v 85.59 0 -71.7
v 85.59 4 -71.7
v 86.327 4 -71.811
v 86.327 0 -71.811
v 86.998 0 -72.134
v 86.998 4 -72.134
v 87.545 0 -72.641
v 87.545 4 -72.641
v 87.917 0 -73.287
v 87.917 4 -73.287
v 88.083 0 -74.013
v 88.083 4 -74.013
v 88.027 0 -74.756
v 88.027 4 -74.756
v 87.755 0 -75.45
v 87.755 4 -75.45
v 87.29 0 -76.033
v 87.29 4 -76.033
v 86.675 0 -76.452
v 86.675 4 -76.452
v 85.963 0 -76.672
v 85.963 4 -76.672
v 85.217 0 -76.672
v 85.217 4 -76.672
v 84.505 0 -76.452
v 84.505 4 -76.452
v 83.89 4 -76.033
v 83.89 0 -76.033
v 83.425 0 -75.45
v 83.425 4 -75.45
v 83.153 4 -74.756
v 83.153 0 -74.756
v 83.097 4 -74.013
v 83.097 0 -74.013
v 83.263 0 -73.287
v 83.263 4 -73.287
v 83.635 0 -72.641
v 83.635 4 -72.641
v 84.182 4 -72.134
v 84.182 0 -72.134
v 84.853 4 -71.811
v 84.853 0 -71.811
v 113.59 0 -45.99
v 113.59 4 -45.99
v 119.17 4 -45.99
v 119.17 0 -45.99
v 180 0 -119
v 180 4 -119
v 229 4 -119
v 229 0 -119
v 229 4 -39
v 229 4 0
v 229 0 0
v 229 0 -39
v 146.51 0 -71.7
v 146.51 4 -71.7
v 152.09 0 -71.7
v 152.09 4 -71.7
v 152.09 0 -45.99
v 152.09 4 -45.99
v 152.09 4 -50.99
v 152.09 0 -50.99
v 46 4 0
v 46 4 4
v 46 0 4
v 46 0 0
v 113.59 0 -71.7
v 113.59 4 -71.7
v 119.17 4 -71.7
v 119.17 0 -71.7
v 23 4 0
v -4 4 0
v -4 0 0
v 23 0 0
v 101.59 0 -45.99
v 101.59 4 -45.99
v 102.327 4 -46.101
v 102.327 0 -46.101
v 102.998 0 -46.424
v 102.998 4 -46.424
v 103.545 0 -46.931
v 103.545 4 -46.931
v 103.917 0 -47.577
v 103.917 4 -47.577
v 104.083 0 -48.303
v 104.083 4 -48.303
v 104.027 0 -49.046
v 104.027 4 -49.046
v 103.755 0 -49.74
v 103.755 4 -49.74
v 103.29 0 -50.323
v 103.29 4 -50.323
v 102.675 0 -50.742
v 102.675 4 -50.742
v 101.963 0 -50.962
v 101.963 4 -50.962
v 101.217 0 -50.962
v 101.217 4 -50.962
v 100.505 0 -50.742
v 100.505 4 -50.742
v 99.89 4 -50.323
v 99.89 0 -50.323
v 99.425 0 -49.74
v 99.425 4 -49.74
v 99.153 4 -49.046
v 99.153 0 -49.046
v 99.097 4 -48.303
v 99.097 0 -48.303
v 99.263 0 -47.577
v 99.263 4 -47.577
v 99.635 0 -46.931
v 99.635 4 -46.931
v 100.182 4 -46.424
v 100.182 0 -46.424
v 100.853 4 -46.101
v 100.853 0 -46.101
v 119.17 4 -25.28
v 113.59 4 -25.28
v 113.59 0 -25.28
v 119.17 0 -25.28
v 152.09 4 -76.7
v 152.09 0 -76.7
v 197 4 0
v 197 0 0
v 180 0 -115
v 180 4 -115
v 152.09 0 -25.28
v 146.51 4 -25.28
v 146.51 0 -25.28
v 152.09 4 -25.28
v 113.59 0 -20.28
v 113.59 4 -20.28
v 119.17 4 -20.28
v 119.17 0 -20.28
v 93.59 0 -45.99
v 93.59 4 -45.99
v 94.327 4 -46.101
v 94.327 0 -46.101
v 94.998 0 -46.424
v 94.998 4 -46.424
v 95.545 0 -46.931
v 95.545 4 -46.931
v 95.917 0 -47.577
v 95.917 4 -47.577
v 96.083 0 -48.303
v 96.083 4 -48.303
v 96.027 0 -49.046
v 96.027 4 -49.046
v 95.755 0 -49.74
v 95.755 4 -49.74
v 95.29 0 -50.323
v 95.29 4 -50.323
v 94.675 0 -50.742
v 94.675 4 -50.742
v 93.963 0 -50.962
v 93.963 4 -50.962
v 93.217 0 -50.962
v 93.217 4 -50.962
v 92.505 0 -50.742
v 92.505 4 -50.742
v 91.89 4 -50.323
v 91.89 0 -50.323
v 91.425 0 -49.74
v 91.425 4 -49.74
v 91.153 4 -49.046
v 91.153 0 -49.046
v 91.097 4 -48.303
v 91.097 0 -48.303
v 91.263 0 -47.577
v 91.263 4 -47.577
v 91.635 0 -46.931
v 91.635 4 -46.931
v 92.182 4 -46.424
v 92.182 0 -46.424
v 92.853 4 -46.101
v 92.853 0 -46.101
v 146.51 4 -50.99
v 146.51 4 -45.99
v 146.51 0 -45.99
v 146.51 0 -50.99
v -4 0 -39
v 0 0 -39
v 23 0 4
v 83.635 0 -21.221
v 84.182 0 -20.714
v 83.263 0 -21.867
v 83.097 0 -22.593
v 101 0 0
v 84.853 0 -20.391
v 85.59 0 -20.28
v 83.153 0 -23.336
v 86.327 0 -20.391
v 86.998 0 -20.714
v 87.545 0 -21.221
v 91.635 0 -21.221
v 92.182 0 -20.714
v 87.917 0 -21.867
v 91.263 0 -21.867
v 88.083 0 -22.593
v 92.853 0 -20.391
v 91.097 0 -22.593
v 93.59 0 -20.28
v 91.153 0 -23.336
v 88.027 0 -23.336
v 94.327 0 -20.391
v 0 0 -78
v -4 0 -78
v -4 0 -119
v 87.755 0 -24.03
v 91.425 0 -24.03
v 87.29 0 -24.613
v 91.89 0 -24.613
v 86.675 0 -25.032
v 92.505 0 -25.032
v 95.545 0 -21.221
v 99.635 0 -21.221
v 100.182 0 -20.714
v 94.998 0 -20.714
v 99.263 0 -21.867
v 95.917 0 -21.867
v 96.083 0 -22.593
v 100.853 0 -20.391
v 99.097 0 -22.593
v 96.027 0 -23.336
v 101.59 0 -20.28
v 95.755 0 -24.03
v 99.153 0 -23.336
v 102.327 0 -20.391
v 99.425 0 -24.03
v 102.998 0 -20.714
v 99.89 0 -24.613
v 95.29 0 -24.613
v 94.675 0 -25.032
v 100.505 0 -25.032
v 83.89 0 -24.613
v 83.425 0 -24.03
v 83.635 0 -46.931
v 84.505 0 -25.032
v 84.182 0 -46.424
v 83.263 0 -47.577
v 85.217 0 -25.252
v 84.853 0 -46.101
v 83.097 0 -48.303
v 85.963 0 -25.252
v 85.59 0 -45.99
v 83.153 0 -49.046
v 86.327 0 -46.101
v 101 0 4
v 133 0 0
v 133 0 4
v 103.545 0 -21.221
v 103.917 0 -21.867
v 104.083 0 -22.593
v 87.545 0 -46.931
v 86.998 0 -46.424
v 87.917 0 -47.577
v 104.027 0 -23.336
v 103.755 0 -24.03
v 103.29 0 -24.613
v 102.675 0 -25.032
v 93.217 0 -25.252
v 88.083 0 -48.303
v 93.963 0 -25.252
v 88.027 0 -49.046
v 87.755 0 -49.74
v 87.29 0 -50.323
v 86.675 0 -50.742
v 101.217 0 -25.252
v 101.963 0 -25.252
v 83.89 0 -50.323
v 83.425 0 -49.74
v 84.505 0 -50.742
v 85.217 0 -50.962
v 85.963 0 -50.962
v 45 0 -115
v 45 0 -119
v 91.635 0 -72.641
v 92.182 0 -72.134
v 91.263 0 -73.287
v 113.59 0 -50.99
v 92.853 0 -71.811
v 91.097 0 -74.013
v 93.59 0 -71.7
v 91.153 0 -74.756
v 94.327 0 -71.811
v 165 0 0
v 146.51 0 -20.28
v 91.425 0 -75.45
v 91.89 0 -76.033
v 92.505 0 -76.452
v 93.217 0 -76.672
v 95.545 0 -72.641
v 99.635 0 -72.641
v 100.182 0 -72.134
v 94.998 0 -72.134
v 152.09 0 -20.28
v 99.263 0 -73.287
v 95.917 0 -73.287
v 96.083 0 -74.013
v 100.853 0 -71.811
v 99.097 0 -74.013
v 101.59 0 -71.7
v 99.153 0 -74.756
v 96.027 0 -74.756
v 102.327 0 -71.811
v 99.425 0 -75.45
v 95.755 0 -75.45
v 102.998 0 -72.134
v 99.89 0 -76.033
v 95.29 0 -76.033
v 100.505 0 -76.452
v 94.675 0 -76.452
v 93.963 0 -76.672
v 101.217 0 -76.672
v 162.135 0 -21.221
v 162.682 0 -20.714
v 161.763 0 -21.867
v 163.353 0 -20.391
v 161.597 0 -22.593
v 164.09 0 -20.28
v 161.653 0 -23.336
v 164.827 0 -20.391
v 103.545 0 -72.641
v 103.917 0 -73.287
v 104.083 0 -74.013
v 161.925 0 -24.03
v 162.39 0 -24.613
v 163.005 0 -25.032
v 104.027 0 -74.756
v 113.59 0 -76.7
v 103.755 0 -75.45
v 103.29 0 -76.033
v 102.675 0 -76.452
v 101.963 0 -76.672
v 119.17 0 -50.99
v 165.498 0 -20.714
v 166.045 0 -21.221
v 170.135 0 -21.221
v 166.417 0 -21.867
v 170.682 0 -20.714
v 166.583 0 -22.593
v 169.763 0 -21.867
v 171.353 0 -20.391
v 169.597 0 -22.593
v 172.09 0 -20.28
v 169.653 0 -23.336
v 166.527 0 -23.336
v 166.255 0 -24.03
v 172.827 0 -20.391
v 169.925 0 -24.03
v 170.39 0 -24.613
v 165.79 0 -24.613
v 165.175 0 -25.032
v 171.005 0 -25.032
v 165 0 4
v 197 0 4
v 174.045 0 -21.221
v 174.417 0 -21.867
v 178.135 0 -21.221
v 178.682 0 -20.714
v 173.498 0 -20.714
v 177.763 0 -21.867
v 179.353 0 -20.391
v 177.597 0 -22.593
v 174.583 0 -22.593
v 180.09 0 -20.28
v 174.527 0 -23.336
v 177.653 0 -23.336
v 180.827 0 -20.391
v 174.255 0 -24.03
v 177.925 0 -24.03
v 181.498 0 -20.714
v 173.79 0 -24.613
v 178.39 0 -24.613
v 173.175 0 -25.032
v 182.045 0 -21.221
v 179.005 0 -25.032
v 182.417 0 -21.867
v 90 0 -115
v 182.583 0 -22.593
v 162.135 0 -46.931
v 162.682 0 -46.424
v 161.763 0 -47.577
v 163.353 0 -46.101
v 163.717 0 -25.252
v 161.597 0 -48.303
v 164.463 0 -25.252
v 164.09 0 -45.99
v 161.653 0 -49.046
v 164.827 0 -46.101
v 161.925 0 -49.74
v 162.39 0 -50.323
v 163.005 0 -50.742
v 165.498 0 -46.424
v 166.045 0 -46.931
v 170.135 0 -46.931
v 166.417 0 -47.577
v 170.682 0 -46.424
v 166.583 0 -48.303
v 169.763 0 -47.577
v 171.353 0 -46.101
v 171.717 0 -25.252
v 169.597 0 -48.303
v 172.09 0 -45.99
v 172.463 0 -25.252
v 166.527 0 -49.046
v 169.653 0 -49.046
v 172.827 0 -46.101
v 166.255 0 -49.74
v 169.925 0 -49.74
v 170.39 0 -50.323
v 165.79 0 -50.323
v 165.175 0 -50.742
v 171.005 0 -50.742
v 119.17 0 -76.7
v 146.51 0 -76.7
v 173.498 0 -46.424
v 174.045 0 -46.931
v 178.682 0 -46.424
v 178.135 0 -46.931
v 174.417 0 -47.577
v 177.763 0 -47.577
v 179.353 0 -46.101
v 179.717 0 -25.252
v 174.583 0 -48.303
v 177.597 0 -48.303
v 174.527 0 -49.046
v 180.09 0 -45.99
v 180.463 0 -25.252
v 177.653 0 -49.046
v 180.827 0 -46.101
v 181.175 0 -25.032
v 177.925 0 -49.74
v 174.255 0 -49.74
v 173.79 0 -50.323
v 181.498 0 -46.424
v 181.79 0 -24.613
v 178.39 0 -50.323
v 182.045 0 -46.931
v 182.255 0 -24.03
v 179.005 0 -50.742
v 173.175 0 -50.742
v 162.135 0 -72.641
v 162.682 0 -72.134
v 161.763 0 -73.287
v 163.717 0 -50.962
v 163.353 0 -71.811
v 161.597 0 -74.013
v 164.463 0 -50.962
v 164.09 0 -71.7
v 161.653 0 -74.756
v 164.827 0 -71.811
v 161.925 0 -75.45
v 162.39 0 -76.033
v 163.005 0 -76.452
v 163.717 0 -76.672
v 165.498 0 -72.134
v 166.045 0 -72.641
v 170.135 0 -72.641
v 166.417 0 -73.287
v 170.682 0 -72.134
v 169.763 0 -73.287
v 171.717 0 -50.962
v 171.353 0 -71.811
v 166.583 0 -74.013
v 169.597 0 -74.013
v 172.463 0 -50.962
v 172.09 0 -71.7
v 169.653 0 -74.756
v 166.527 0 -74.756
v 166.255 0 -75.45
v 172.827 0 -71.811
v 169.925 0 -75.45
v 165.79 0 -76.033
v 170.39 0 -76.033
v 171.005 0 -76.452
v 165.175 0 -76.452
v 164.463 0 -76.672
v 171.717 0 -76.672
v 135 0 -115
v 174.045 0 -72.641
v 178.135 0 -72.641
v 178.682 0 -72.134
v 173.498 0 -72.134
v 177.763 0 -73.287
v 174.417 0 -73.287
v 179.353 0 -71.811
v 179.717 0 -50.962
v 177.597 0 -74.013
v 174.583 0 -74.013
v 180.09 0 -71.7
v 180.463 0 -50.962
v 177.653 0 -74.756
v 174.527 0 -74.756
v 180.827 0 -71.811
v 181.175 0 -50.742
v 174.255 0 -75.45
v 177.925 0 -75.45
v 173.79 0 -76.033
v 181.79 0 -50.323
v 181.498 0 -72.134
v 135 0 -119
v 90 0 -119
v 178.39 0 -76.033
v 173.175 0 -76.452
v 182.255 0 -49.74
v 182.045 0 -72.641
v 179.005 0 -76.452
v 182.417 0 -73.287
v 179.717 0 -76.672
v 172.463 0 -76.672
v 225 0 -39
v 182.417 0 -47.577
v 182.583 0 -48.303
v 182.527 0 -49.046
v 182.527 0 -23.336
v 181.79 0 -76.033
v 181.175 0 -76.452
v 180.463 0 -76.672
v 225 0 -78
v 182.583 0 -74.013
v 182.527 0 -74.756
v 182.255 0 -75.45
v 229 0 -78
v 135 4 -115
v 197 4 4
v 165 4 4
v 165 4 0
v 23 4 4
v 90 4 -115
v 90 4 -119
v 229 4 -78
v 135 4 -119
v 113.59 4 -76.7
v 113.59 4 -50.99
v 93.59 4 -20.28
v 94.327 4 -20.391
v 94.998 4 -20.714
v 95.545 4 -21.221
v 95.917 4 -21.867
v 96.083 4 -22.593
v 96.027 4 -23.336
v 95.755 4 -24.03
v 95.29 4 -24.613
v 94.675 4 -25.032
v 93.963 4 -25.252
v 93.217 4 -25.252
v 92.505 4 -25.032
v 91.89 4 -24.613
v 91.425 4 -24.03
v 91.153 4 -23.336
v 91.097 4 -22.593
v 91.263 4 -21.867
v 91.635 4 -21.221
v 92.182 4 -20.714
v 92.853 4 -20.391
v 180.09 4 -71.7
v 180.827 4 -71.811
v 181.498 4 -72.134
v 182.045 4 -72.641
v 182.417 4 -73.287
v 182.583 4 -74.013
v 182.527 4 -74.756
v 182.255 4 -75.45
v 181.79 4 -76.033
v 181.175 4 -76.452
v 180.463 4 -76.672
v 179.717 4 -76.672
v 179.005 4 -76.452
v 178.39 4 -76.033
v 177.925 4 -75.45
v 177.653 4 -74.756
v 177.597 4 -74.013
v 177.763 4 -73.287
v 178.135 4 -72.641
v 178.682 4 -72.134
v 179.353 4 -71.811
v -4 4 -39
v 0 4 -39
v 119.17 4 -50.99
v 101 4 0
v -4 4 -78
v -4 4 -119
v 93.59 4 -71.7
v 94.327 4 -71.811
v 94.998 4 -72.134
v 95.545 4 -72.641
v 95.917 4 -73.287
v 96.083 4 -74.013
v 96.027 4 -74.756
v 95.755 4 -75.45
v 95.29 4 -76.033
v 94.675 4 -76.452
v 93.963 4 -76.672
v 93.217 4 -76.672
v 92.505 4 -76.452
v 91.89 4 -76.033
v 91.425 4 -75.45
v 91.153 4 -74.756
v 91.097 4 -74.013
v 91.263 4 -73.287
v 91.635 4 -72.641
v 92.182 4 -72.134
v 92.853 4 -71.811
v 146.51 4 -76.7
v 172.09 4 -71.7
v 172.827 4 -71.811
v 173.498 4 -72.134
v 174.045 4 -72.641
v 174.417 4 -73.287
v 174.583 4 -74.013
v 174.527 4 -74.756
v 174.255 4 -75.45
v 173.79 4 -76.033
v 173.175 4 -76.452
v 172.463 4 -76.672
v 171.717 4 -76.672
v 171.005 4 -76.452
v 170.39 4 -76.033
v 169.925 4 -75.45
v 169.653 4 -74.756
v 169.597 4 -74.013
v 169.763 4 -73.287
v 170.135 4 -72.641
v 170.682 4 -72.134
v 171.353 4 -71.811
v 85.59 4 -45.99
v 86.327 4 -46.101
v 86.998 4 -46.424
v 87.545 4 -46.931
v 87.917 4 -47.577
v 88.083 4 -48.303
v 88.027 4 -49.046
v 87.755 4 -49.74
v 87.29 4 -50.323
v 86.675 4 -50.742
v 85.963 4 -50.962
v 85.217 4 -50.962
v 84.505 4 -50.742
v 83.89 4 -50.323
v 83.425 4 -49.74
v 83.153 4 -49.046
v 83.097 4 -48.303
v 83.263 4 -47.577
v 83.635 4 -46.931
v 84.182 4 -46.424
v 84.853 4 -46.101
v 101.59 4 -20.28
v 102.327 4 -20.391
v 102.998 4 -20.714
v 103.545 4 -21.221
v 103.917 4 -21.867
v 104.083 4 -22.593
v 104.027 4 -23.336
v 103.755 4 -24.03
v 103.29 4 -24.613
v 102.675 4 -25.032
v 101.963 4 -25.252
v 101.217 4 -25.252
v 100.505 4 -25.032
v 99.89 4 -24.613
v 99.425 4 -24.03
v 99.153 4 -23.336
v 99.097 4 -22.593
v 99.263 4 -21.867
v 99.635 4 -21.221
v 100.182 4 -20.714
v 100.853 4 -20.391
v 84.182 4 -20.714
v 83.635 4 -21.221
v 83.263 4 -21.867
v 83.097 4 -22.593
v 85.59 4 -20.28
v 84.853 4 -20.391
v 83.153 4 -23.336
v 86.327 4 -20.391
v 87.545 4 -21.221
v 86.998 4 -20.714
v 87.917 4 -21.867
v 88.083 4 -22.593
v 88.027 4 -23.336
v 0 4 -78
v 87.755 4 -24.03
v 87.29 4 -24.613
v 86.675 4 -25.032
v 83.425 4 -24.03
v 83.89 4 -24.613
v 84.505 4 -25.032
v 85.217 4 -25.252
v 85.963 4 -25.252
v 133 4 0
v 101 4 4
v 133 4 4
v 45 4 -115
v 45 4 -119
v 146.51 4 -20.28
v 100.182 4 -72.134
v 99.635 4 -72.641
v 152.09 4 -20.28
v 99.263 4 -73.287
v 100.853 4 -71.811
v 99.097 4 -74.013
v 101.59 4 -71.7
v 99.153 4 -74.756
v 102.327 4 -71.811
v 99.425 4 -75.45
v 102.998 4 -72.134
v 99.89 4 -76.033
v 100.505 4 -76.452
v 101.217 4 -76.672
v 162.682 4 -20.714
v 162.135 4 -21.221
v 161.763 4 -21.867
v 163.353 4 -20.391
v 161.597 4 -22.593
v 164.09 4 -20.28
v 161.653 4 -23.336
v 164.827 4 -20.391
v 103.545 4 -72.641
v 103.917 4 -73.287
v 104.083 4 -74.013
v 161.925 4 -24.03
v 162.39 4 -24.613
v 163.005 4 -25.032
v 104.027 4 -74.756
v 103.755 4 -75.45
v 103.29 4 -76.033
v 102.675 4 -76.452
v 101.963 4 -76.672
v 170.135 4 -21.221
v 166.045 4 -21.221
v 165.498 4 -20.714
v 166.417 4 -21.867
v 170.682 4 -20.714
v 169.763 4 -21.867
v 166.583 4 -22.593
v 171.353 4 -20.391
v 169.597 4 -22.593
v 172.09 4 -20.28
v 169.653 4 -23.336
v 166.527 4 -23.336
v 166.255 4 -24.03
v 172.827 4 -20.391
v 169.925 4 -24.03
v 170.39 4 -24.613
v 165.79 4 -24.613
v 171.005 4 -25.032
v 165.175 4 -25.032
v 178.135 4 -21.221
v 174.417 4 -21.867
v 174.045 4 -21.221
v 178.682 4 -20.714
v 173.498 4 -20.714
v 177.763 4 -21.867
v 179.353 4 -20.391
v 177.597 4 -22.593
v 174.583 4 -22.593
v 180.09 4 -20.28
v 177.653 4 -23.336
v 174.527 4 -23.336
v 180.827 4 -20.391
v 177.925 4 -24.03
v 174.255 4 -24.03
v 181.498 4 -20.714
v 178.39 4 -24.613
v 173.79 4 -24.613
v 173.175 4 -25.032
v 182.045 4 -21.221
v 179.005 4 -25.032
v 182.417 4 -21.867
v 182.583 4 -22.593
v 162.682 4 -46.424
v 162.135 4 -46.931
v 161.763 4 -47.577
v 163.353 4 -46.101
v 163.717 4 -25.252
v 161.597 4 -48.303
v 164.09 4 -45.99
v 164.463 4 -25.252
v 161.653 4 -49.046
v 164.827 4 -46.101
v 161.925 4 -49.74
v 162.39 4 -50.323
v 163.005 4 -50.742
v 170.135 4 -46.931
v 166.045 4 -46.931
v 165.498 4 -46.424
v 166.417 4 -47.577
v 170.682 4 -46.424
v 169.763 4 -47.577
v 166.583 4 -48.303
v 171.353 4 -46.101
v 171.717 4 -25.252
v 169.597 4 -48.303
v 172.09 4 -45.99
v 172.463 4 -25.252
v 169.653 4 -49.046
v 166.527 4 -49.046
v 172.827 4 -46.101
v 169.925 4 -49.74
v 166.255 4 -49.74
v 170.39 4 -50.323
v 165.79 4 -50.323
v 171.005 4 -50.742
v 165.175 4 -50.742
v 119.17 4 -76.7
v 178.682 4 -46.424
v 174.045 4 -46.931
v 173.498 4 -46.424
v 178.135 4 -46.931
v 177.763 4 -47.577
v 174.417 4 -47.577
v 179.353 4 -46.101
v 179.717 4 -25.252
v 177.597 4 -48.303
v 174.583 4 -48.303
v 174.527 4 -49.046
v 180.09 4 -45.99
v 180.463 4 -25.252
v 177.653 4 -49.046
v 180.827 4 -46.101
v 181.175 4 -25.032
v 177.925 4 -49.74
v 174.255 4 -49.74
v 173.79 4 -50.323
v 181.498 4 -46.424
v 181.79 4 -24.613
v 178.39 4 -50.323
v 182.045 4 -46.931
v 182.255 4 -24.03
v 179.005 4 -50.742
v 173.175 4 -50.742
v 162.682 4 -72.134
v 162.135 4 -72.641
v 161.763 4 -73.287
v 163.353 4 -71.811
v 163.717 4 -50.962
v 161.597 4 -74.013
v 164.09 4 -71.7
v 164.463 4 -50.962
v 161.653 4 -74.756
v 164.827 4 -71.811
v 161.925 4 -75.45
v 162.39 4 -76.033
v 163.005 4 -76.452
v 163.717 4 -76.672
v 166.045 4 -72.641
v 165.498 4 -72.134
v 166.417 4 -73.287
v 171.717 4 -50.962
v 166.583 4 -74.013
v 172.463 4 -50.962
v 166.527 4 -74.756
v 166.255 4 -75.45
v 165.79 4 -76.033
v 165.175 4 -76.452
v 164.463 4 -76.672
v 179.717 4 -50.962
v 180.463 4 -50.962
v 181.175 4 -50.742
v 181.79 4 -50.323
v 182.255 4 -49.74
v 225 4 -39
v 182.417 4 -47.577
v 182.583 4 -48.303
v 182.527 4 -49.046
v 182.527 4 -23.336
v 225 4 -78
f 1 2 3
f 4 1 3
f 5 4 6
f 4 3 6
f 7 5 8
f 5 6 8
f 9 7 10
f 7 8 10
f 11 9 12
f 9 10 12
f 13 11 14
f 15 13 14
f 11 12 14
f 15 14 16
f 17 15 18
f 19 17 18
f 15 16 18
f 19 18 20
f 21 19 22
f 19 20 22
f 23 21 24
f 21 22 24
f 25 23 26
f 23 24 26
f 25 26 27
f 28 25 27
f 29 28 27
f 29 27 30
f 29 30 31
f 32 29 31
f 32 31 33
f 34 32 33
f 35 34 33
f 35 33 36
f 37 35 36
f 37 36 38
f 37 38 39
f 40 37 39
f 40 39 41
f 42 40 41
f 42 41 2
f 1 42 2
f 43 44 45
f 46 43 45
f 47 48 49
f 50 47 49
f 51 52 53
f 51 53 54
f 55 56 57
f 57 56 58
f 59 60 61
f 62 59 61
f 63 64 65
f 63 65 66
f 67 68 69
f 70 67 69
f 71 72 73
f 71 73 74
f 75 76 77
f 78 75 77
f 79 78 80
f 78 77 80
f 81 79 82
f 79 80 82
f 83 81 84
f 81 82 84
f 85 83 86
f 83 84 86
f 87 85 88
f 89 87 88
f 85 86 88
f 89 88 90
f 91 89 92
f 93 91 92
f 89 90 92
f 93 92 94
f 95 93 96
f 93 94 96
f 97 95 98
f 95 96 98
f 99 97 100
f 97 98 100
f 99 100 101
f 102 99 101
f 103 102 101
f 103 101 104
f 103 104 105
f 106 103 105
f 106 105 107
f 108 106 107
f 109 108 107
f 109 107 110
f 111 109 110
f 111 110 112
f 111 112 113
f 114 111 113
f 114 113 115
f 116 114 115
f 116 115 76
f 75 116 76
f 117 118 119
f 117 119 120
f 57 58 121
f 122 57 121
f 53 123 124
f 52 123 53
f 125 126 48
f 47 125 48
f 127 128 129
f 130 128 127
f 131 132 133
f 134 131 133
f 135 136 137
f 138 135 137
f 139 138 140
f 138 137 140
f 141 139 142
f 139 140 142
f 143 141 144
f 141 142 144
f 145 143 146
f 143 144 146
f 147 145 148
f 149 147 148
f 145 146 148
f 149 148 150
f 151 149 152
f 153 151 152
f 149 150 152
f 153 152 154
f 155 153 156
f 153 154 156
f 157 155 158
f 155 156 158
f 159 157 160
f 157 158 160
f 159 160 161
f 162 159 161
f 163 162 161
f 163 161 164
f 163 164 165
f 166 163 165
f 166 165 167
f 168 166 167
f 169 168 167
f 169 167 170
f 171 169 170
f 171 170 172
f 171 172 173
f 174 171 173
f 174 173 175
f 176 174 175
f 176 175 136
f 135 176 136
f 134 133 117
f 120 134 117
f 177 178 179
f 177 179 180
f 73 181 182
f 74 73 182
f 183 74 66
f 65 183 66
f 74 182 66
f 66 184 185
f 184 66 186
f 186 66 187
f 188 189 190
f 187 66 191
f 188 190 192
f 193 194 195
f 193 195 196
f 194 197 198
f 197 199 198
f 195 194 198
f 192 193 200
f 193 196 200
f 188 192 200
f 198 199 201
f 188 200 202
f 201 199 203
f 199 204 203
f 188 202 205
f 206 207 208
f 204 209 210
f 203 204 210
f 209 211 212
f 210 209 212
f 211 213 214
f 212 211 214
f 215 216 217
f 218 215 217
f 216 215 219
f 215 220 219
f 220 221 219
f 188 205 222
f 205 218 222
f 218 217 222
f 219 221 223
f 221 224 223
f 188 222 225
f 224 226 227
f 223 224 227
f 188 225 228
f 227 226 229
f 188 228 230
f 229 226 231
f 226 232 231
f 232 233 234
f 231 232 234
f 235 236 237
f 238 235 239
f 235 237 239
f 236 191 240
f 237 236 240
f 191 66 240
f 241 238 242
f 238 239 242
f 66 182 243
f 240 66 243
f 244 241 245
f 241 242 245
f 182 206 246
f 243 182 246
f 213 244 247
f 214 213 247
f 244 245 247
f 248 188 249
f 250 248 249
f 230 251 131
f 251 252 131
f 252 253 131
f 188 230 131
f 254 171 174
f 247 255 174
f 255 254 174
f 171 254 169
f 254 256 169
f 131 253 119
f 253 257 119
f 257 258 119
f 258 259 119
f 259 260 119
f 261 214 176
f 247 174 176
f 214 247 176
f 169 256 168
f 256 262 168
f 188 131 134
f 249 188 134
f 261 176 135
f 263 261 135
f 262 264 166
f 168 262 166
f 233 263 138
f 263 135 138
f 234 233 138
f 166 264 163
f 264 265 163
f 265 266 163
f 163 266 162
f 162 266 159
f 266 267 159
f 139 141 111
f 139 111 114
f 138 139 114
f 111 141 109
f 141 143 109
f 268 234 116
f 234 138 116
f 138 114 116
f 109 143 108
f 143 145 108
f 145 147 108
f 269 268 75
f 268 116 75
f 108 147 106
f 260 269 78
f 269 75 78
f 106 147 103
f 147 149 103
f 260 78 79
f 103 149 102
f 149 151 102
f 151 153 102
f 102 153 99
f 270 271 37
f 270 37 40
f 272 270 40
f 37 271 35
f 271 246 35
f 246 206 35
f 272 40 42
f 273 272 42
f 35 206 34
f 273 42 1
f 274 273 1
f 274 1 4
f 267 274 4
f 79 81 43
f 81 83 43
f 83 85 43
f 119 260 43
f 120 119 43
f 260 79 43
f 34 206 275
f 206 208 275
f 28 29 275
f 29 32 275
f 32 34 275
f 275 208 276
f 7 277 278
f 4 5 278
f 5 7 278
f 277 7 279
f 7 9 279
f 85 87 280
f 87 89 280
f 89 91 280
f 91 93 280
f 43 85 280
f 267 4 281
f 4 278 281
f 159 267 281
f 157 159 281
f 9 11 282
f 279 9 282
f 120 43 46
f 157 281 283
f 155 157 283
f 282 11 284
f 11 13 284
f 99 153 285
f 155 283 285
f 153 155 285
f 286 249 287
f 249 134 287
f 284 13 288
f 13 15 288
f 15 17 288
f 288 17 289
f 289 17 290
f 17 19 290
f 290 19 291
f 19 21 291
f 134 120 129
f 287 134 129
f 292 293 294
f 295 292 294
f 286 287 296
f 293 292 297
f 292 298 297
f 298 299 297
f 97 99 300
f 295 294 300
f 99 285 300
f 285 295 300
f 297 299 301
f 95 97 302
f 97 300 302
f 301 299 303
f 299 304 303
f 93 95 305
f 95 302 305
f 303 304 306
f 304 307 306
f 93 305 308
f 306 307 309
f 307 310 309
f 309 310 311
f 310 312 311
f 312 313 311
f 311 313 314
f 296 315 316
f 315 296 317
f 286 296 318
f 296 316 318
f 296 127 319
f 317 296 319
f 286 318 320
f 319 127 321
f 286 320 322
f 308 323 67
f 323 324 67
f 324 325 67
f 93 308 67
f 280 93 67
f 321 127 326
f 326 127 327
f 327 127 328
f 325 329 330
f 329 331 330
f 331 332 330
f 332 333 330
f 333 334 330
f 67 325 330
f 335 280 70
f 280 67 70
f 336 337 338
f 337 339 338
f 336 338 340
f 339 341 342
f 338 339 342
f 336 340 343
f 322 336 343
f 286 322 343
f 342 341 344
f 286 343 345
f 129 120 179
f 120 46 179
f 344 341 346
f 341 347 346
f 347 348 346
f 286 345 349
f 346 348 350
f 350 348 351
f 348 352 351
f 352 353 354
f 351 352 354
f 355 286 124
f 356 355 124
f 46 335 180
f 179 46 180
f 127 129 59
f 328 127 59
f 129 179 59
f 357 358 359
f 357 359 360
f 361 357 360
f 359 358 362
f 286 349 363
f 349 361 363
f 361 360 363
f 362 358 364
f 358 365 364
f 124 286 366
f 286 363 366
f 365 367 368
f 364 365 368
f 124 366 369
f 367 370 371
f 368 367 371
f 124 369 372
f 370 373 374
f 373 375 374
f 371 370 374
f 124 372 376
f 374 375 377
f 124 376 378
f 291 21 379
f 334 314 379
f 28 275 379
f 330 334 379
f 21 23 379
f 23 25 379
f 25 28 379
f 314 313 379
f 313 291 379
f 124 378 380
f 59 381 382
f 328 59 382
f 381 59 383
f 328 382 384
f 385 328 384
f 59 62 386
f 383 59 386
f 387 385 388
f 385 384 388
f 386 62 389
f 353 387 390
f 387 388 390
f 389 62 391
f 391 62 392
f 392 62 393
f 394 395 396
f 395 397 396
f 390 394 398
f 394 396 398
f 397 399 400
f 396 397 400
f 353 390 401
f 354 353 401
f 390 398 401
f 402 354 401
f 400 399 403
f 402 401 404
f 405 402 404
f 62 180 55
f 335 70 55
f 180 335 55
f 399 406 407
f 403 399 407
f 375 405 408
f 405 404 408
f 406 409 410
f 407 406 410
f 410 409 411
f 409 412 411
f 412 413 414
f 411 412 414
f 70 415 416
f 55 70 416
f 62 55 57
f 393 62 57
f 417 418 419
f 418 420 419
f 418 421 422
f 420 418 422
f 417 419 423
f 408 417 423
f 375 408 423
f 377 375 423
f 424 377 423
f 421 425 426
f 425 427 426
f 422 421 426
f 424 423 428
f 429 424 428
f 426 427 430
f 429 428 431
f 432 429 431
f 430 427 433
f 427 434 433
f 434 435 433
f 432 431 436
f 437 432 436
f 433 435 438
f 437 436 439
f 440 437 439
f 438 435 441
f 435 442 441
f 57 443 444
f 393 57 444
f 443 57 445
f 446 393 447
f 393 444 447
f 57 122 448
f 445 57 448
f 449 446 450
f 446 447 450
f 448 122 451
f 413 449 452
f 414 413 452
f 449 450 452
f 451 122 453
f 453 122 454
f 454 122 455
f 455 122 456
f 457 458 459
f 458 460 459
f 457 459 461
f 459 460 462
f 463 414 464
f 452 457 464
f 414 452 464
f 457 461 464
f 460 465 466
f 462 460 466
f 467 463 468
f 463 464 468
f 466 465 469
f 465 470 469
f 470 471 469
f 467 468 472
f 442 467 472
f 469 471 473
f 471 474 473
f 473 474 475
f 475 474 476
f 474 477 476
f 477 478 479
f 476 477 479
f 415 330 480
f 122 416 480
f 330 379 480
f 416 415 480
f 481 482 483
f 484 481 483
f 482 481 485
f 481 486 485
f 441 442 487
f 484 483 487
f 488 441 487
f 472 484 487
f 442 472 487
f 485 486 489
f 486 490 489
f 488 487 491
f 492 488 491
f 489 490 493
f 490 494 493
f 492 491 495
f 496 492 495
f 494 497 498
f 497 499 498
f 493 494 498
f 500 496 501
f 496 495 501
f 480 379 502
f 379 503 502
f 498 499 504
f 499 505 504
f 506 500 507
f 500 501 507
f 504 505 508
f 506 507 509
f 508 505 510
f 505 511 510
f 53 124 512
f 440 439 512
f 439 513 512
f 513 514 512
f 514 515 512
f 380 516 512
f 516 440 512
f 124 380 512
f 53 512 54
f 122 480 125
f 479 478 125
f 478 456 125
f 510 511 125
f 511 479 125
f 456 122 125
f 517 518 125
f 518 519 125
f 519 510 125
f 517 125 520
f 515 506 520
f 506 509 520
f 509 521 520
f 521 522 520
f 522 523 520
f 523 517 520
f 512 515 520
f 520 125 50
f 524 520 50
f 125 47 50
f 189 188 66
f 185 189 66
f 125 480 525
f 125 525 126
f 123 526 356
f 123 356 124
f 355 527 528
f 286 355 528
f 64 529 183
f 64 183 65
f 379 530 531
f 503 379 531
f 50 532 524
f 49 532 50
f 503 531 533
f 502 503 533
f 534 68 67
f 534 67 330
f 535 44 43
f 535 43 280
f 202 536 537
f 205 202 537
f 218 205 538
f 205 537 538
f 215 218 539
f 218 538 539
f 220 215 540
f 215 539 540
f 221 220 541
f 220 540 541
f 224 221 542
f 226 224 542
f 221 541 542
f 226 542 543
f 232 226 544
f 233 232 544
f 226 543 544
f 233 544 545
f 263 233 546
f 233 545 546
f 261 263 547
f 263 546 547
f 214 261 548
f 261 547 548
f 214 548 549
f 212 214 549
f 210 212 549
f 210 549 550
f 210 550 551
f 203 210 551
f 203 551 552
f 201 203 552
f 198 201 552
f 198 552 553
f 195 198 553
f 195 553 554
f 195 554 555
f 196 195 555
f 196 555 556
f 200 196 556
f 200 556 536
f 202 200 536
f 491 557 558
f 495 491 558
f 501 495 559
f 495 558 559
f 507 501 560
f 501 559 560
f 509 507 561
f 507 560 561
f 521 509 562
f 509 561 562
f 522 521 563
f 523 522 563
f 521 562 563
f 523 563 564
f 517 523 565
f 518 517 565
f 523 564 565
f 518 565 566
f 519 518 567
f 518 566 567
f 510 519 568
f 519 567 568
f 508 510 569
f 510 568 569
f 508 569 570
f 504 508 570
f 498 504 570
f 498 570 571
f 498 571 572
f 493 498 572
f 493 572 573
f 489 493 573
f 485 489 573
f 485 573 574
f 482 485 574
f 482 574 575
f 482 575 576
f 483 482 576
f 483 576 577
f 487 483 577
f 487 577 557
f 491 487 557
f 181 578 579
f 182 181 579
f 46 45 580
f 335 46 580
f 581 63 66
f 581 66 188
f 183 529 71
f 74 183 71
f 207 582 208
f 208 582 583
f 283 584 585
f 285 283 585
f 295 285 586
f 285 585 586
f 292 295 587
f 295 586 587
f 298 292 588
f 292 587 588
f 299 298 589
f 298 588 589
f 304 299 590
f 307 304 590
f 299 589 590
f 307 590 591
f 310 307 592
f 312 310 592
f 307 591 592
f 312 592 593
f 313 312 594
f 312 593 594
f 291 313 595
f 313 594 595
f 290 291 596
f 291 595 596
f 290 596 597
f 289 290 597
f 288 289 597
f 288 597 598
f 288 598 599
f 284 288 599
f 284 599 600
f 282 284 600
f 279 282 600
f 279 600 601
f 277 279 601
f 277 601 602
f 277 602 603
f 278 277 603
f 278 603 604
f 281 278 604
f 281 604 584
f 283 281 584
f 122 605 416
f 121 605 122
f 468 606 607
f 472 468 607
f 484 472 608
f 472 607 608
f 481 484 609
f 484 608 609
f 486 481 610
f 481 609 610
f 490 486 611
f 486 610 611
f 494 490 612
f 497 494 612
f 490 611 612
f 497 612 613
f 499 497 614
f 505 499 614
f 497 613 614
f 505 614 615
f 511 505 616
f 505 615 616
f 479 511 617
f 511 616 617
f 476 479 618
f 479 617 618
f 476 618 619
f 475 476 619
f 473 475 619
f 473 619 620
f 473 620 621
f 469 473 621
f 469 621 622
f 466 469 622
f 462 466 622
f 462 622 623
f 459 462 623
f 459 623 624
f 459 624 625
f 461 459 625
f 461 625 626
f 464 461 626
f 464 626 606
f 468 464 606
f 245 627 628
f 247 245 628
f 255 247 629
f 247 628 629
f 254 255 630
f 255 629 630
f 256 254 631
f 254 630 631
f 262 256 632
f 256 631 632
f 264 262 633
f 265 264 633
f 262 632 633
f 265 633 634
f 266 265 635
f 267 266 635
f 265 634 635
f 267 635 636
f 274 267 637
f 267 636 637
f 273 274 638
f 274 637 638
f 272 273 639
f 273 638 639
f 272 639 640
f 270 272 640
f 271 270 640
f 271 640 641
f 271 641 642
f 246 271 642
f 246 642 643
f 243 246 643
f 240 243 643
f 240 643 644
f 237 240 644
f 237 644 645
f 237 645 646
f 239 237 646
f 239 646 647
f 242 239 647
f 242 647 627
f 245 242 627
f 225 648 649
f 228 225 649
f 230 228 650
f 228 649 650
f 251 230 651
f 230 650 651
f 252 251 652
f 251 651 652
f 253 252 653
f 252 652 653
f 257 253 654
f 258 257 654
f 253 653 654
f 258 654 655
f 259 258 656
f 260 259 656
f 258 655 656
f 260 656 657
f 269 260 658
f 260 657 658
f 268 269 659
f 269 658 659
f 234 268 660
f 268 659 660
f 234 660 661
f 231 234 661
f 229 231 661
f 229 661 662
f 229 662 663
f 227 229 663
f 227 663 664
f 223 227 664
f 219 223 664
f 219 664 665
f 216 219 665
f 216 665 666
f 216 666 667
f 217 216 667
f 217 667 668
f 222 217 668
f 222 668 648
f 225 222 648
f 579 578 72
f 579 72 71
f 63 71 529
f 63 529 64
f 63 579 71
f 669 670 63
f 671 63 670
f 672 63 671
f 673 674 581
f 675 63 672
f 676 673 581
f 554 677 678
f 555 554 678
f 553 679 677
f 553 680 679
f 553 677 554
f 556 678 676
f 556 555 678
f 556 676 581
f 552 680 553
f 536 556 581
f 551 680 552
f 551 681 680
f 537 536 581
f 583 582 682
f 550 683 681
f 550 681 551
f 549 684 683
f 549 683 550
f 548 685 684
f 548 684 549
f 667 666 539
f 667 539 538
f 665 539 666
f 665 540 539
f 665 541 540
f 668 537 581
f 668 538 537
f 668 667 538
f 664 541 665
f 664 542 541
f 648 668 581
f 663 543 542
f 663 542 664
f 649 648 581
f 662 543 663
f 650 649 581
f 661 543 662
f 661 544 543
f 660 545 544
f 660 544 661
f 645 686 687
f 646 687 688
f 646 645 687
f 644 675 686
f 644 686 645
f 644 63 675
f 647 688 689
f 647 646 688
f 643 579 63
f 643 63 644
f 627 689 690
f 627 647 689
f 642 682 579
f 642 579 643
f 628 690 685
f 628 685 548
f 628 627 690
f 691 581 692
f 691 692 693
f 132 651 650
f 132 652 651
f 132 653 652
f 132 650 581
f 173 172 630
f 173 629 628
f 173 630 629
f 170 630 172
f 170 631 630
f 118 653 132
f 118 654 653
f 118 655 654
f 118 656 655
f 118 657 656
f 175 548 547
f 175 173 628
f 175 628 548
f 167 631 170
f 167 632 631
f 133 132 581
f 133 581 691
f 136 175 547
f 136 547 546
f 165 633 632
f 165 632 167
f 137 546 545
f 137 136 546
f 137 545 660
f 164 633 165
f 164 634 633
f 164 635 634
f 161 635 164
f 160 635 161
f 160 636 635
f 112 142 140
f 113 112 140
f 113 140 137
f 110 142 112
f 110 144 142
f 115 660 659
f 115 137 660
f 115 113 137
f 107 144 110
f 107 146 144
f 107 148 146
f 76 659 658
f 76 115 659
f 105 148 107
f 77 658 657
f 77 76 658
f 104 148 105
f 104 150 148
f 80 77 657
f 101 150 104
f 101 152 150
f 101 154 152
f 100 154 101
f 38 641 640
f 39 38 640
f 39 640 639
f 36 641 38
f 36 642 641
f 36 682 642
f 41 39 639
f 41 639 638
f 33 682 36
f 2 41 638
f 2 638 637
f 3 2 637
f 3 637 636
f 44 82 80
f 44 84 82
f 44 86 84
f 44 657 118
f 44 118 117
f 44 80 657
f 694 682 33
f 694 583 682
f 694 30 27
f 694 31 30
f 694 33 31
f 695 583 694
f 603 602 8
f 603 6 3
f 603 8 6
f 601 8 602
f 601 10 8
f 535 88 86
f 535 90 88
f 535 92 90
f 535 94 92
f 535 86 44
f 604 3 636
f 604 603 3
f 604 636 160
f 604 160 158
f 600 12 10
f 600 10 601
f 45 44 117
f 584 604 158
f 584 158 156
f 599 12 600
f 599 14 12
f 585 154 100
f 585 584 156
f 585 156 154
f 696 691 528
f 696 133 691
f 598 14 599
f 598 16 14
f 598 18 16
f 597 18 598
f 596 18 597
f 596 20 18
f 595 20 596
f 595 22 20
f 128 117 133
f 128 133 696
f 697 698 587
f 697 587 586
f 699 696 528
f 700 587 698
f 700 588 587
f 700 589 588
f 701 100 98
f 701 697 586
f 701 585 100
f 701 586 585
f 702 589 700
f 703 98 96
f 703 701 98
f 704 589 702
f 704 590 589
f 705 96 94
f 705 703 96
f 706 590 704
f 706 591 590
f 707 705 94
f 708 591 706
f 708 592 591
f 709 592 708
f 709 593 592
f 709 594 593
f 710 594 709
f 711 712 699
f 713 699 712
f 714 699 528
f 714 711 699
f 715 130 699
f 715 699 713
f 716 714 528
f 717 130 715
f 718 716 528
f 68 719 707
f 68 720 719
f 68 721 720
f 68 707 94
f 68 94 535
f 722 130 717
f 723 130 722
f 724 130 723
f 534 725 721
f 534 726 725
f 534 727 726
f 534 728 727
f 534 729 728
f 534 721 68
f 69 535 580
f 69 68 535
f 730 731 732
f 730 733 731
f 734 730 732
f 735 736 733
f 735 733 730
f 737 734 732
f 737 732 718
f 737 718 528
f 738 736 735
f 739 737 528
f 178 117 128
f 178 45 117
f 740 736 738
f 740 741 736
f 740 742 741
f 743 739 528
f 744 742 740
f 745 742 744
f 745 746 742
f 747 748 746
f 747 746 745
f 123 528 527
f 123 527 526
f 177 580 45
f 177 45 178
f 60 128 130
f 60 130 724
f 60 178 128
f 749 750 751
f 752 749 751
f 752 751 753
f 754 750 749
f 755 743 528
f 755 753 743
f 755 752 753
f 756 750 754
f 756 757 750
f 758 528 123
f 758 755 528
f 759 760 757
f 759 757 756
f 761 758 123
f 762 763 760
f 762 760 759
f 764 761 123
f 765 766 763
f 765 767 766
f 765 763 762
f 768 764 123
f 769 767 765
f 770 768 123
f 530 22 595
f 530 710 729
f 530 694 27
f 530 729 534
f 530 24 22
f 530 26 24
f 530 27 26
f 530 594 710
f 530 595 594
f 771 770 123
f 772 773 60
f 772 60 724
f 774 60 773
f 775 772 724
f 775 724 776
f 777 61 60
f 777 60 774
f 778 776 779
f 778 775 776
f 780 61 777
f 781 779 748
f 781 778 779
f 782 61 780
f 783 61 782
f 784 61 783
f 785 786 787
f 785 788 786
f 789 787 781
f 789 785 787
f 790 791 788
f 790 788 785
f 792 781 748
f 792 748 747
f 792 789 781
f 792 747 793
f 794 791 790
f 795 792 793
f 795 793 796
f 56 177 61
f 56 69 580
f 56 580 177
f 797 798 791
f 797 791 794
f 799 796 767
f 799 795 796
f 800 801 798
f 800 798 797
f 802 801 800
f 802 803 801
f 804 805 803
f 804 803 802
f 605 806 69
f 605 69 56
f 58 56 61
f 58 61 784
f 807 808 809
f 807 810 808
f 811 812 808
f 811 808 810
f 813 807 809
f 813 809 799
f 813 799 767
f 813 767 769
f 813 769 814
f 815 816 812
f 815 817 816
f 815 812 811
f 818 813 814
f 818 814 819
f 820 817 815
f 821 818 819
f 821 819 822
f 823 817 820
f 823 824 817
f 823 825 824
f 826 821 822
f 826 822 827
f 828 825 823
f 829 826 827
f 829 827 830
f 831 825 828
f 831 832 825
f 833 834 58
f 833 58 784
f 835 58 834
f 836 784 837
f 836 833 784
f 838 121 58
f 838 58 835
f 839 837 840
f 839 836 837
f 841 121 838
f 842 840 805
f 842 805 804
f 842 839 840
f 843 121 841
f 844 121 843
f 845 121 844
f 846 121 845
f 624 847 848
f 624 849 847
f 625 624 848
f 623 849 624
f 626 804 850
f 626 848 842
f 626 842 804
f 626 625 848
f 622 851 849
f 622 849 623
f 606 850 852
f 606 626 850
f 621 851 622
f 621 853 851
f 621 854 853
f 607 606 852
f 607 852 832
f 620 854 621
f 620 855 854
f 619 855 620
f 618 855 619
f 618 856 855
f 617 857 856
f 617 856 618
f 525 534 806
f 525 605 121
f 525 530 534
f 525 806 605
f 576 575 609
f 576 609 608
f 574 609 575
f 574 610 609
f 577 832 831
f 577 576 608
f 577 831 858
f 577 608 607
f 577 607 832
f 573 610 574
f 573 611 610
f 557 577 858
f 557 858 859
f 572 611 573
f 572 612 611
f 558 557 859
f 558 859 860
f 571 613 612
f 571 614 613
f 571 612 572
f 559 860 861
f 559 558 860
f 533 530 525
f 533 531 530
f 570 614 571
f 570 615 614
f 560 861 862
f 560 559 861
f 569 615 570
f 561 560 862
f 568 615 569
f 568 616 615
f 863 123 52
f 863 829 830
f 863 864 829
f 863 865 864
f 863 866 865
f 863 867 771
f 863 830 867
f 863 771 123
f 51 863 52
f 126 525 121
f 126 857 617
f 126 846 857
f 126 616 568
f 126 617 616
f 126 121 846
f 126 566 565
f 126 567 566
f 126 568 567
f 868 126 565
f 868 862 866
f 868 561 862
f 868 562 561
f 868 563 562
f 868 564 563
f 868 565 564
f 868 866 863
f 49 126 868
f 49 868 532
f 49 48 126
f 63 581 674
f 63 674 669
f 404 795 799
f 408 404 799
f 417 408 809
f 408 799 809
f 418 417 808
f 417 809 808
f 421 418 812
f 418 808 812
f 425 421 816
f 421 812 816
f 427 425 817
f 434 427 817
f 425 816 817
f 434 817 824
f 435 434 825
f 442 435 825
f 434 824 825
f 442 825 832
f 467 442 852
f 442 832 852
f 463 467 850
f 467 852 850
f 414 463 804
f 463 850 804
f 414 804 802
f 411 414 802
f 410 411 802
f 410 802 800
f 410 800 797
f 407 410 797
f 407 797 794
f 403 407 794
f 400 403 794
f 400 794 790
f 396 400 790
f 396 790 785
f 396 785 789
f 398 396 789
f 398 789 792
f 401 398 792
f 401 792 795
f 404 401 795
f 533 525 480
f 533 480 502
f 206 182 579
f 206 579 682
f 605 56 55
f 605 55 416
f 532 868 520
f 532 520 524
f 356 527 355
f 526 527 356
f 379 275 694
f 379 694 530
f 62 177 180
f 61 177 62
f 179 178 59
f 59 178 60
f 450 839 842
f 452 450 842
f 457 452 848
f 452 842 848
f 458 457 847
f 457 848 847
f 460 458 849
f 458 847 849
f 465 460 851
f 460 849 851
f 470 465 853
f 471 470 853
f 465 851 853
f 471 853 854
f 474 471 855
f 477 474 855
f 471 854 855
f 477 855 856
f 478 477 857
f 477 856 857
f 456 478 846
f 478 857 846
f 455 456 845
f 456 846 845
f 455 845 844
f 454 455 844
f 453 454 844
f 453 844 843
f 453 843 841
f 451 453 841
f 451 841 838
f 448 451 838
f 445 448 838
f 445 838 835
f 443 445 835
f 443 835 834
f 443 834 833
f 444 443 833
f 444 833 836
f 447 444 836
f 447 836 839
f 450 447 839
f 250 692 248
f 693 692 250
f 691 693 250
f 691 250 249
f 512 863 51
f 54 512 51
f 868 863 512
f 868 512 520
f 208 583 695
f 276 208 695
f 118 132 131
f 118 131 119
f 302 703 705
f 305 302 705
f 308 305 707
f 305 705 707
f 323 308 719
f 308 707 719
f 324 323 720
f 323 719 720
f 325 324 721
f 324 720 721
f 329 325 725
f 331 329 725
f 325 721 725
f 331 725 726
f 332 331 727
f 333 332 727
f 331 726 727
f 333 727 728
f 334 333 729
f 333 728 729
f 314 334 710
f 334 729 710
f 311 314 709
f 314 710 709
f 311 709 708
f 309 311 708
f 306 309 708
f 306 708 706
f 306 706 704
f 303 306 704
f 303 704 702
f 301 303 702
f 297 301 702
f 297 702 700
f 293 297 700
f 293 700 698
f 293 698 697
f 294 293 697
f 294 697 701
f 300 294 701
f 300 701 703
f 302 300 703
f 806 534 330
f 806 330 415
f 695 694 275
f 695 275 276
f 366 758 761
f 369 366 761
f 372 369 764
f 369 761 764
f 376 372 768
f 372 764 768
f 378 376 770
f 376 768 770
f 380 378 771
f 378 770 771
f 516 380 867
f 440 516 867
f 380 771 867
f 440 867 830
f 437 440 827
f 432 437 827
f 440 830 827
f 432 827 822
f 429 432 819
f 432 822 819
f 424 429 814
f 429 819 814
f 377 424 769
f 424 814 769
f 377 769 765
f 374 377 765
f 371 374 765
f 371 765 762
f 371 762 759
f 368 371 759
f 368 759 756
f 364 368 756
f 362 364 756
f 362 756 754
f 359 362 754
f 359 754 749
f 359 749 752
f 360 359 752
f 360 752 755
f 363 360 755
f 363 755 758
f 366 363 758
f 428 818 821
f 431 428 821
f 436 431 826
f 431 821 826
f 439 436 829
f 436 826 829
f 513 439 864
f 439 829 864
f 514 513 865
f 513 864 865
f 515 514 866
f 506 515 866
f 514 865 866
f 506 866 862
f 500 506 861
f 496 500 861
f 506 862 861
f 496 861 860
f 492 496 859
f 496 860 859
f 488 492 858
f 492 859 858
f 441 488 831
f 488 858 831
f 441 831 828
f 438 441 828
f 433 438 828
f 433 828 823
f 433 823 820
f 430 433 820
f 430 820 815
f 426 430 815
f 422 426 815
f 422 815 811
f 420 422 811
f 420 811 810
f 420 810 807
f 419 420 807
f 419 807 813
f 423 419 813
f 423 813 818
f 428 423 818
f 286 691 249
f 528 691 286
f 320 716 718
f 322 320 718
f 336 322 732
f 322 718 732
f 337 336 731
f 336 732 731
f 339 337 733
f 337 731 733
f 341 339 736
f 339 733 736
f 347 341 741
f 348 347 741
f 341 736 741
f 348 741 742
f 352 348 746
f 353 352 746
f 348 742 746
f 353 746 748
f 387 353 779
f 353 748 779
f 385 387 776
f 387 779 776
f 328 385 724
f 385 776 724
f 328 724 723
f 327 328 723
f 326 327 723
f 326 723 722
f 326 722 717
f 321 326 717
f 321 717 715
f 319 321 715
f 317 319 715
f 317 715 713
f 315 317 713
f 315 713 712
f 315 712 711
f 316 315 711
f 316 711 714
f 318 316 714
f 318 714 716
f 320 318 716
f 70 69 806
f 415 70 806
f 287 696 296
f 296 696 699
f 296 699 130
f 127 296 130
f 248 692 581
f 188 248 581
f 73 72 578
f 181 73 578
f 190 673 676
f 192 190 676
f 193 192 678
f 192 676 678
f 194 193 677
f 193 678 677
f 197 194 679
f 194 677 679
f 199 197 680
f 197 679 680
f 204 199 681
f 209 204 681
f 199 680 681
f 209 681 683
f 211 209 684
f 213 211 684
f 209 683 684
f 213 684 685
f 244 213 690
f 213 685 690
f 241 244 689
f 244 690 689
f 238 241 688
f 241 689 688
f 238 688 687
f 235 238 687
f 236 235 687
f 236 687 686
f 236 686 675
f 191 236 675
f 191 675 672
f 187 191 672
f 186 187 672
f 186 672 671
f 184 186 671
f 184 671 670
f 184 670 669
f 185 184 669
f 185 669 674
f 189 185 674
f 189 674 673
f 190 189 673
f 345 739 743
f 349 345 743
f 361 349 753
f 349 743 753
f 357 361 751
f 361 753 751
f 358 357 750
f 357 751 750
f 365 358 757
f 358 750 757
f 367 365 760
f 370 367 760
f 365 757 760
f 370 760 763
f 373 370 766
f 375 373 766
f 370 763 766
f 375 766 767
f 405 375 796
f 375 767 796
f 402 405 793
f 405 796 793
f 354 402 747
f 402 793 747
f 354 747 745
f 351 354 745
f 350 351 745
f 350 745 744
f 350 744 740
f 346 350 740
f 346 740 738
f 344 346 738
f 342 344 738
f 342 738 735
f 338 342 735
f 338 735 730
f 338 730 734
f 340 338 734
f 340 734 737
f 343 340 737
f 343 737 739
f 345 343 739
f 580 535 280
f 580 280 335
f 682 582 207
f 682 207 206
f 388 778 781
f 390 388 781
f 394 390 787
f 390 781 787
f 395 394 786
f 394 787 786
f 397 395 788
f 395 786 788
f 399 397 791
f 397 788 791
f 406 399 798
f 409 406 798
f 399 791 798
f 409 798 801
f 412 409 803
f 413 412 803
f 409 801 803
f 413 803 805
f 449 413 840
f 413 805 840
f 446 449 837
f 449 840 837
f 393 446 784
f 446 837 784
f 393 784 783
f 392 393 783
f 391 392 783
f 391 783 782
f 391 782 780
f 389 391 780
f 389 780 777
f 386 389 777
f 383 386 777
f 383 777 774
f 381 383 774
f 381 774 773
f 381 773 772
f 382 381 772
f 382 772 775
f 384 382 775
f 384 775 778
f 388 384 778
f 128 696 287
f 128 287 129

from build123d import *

# Parameters (mm, degrees)
SKETCH1_W           = 225
SKETCH1_H           = 115
BOSS_EXTRUDE1_DEPTH = 4
SKETCH3_R           = 2.5
SKETCH3_W           = 5.58
SKETCH3_H           = 5
CUT_EXTRUDE2_DEPTH  = 10
SKETCH4_W           = 4
SKETCH4_H           = 39
BOSS_EXTRUDE2_DEPTH = 4
SKETCH5_W           = 45
SKETCH5_H           = 4
BOSS_EXTRUDE3_DEPTH = 4
LPATTERN1_COUNT     = 2
LPATTERN1_PITCH     = 229
SKETCH6_W           = 23
SKETCH6_H           = 4
BOSS_EXTRUDE4_DEPTH = 4
SKETCH7_W           = 32
SKETCH7_H           = 4
BOSS_EXTRUDE5_DEPTH = 4
SKETCH8_W           = 4
SKETCH8_H           = 2
BOSS_EXTRUDE6_DEPTH = 4


with BuildPart() as part:
    # Sketch1 → Boss-Extrude1 (new body)
    with BuildSketch(Plane(origin=(0, 0, 0), x_dir=(1, 0, 0), z_dir=(0, 1, 0))):
        with Locations((112.5, 57.5)):
            Rectangle(SKETCH1_W, SKETCH1_H)
    extrude(amount=BOSS_EXTRUDE1_DEPTH)

    # Sketch3 → Cut-Extrude2 (cut)
    with BuildSketch(Plane(origin=(0, 4, 0), x_dir=(1, 0, 0), z_dir=(0, 1, 0))):
        with Locations(Location((180.08999958, 22.78, 0), (0, 0, 270))):
            Circle(SKETCH3_R)
        with Locations(Location((172.08999958, 22.78, 0), (0, 0, 270))):
            Circle(SKETCH3_R)
        with Locations(Location((164.08999958, 22.78, 0), (0, 0, 270))):
            Circle(SKETCH3_R)
        with Locations((149.29999958, 22.78)):
            Rectangle(SKETCH3_W, SKETCH3_H)
        with Locations(Location((180.08999958, 48.49, 0), (0, 0, 270))):
            Circle(SKETCH3_R)
        with Locations(Location((172.08999958, 48.49, 0), (0, 0, 270))):
            Circle(SKETCH3_R)
        with Locations(Location((164.08999958, 48.49, 0), (0, 0, 270))):
            Circle(SKETCH3_R)
        with Locations((149.29999958, 48.49)):
            Rectangle(SKETCH3_W, SKETCH3_H)
        with Locations(Location((180.08999958, 74.2, 0), (0, 0, 270))):
            Circle(SKETCH3_R)
        with Locations(Location((172.08999958, 74.2, 0), (0, 0, 270))):
            Circle(SKETCH3_R)
        with Locations(Location((164.08999958, 74.2, 0), (0, 0, 270))):
            Circle(SKETCH3_R)
        with Locations((149.29999958, 74.2)):
            Rectangle(SKETCH3_W, SKETCH3_H)
        with Locations((116.37999958, 74.2)):
            Rectangle(SKETCH3_W, SKETCH3_H)
        with Locations((116.37999958, 48.49)):
            Rectangle(SKETCH3_W, SKETCH3_H)
        with Locations((116.37999958, 22.78)):
            Rectangle(SKETCH3_W, SKETCH3_H)
        with Locations(Location((101.58999958, 22.78, 0), (0, 0, 270))):
            Circle(SKETCH3_R)
        with Locations(Location((93.58999958, 22.78, 0), (0, 0, 270))):
            Circle(SKETCH3_R)
        with Locations(Location((85.58999958, 22.78, 0), (0, 0, 270))):
            Circle(SKETCH3_R)
        with Locations(Location((85.58999958, 48.49, 0), (0, 0, 270))):
            Circle(SKETCH3_R)
        with Locations(Location((93.58999958, 48.49, 0), (0, 0, 270))):
            Circle(SKETCH3_R)
        with Locations(Location((101.58999958, 48.49, 0), (0, 0, 270))):
            Circle(SKETCH3_R)
        with Locations(Location((101.58999958, 74.2, 0), (0, 0, 270))):
            Circle(SKETCH3_R)
        with Locations(Location((93.58999958, 74.2, 0), (0, 0, 270))):
            Circle(SKETCH3_R)
        with Locations(Location((85.58999958, 74.2, 0), (0, 0, 270))):
            Circle(SKETCH3_R)
    extrude(amount=-CUT_EXTRUDE2_DEPTH, mode=Mode.SUBTRACT)

    # Sketch4 → Boss-Extrude2 (add)
    with BuildSketch(Plane(origin=(0, 4, 0), x_dir=(1, 0, 0), z_dir=(0, 1, 0))):
        with Locations((-2, 19.5)):
            Rectangle(SKETCH4_W, SKETCH4_H)
        with Locations((-2, 97.5)):
            Rectangle(SKETCH4_W, SKETCH4_H)
    boss_extrude2 = extrude(amount=-BOSS_EXTRUDE2_DEPTH)

    # Sketch5 → Boss-Extrude3 (add)
    with BuildSketch(Plane(origin=(0, 4, 0), x_dir=(1, 0, 0), z_dir=(0, 1, 0))):
        with Locations((112.5, 117)):
            Rectangle(SKETCH5_W, SKETCH5_H)
        with Locations((202.5, 117)):
            Rectangle(SKETCH5_W, SKETCH5_H)
        with Locations((22.5, 117)):
            Rectangle(SKETCH5_W, SKETCH5_H)
    extrude(amount=-BOSS_EXTRUDE3_DEPTH)

    # LPattern1: Boss-Extrude2 ×2
    with Locations(*[(i * LPATTERN1_PITCH, 0, 0) for i in range(1, LPATTERN1_COUNT)]):
        add(boss_extrude2)

    # Sketch6 → Boss-Extrude4 (add)
    with BuildSketch(Plane(origin=(0, 4, 0), x_dir=(1, 0, 0), z_dir=(0, 1, 0))):
        with Locations((34.5, -2)):
            Rectangle(SKETCH6_W, SKETCH6_H)
    extrude(amount=-BOSS_EXTRUDE4_DEPTH)

    # Sketch7 → Boss-Extrude5 (add)
    with BuildSketch(Plane(origin=(0, 4, 0), x_dir=(1, 0, 0), z_dir=(0, 1, 0))):
        with Locations((181, -2)):
            Rectangle(SKETCH7_W, SKETCH7_H)
        with Locations((117, -2)):
            Rectangle(SKETCH7_W, SKETCH7_H)
    extrude(amount=-BOSS_EXTRUDE5_DEPTH)

    # Sketch8 → Boss-Extrude6 (add)
    with BuildSketch(Plane(origin=(0, 4, 0), x_dir=(1, 0, 0), z_dir=(0, 1, 0))):
        with Locations((-2, 118)):
            Rectangle(SKETCH8_W, SKETCH8_H)
        with Locations((227, 118)):
            Rectangle(SKETCH8_W, SKETCH8_H)
    extrude(amount=-BOSS_EXTRUDE6_DEPTH)


solid = part.part
